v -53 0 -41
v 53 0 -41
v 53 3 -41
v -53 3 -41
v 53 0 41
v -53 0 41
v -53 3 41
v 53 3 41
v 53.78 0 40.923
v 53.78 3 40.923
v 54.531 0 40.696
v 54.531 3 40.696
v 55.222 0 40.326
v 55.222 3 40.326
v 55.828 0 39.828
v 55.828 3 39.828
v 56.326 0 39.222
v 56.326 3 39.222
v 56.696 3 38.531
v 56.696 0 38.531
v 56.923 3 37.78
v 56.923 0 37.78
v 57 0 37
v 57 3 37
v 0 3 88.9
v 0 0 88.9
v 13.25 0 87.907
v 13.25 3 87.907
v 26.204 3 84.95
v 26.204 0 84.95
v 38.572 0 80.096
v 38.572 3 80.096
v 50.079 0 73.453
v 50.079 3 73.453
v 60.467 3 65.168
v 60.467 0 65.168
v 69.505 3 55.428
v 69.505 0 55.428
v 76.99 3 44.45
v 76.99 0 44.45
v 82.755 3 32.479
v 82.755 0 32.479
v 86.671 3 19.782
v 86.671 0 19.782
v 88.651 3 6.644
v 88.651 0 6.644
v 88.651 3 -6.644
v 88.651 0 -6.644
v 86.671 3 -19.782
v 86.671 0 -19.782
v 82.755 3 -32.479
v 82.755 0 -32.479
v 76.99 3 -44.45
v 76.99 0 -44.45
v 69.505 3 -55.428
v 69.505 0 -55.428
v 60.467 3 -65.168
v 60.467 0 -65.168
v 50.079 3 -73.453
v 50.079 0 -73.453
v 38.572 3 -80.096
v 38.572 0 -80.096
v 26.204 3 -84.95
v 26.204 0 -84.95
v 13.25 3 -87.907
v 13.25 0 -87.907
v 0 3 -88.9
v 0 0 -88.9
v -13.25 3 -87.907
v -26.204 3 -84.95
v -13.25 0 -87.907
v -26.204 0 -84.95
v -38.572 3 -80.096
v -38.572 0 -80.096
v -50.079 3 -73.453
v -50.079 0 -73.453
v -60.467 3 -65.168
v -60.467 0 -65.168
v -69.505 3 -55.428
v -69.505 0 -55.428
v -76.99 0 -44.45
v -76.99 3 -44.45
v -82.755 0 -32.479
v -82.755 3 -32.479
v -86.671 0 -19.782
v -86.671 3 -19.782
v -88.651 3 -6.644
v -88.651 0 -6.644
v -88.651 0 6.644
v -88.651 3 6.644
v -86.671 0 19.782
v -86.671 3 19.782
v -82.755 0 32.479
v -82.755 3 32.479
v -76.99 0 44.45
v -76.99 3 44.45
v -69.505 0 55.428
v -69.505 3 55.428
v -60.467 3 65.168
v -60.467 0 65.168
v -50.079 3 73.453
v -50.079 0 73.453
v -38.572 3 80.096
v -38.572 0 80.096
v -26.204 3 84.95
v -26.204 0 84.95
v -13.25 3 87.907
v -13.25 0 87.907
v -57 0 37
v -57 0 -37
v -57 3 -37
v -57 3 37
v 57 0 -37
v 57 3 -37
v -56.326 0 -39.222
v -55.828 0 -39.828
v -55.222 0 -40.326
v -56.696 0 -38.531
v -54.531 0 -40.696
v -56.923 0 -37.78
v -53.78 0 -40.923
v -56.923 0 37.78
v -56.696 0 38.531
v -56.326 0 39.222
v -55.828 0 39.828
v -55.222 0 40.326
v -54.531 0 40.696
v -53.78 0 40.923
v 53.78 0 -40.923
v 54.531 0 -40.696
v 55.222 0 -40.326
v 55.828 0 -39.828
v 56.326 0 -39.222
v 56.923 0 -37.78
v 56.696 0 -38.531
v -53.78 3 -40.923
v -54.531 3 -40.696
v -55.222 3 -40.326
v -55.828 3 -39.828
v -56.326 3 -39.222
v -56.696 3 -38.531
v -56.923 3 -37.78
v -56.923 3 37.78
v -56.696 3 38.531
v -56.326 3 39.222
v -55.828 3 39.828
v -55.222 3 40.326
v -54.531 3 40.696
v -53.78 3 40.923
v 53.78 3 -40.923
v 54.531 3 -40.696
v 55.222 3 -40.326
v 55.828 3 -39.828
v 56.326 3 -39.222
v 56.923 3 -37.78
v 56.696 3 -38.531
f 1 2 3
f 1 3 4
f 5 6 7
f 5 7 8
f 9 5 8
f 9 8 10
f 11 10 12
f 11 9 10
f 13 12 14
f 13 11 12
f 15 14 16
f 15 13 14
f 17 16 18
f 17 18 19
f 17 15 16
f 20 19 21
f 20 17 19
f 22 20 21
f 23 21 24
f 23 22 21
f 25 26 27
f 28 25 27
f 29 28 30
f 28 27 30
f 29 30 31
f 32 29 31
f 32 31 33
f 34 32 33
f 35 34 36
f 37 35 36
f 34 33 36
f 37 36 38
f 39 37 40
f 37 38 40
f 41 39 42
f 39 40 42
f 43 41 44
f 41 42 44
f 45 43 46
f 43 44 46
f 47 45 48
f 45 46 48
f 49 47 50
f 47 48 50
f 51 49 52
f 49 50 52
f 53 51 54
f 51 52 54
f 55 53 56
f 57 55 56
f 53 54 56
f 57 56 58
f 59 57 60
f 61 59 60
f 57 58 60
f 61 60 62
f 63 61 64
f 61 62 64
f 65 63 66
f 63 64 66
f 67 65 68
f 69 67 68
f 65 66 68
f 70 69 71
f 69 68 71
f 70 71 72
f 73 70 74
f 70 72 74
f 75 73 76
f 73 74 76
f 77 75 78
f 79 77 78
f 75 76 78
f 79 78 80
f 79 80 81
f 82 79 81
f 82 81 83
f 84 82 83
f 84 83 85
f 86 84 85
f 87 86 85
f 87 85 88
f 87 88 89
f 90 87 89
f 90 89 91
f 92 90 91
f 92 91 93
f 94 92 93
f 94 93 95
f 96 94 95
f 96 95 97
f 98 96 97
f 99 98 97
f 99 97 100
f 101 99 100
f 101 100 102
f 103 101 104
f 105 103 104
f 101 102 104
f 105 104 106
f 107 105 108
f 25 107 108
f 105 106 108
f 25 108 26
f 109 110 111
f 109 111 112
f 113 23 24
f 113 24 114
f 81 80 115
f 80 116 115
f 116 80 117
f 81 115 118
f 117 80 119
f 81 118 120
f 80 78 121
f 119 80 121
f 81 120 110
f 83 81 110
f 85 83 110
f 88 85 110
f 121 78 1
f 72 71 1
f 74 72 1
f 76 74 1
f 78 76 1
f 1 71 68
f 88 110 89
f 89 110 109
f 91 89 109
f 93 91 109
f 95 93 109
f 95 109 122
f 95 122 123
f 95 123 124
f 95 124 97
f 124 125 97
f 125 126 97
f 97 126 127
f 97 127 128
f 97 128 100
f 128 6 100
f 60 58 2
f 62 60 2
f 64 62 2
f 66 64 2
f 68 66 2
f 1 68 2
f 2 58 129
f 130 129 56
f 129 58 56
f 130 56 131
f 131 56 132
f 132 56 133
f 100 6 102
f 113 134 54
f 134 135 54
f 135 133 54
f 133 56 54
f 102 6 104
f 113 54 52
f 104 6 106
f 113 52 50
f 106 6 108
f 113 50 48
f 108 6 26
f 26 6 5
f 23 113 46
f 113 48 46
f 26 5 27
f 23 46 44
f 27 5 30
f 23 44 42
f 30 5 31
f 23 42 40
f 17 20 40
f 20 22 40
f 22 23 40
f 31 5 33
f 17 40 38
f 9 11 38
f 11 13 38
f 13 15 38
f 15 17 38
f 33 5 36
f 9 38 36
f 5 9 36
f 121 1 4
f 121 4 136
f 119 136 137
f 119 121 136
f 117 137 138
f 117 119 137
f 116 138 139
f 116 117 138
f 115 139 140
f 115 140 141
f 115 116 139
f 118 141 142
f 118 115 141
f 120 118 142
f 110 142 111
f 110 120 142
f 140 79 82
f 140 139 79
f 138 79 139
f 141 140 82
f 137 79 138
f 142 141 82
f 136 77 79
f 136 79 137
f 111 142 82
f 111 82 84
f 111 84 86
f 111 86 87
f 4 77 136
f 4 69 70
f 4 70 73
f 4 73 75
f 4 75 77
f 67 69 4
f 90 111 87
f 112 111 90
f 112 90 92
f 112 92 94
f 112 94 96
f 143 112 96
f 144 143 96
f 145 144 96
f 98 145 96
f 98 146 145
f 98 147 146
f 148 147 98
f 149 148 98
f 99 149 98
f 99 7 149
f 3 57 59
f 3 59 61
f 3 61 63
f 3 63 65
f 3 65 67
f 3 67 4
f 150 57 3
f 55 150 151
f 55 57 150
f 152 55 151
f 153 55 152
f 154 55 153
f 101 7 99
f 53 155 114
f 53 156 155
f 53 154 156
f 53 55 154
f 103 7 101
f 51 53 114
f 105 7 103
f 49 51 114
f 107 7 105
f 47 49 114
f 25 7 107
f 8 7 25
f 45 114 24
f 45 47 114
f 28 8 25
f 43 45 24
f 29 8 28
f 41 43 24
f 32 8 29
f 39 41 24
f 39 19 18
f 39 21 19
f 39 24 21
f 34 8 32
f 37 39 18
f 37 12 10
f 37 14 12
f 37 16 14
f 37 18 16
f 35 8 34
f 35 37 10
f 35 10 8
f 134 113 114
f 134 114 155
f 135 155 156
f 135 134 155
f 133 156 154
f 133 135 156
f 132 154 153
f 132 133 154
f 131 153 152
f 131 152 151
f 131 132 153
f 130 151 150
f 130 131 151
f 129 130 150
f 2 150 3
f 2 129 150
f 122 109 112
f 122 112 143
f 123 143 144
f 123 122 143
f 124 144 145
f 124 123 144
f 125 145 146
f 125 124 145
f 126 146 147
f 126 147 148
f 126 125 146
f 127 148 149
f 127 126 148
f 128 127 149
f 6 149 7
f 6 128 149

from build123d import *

# Parameters (mm, degrees)
SKETCH1_R           = 88.9
BOSS_EXTRUDE1_DEPTH = 3
CUT_EXTRUDE2_DEPTH  = 3


with BuildPart() as part:
    # Sketch1 → Boss-Extrude1 (new body)
    with BuildSketch(Plane(origin=(0, 0, 0), x_dir=(1, 0, 0), z_dir=(0, 1, 0))):
        with Locations(Location((0, 0, 0), (0, 0, 270))):
            Circle(SKETCH1_R)
    extrude(amount=BOSS_EXTRUDE1_DEPTH)

    # Sketch3 → Cut-Extrude2 (cut)
    with BuildSketch(Plane.XZ):
        with BuildLine():
            Line((53, -41), (-53, -41))
            ThreePointArc((-53, -41), (-55.828427125, -39.828427125), (-57, -37))
            Line((-57, -37), (-57, 37))
            ThreePointArc((-57, 37), (-55.828427125, 39.828427125), (-53, 41))
            Line((-53, 41), (53, 41))
            ThreePointArc((53, 41), (55.828427125, 39.828427125), (57, 37))
            Line((57, 37), (57, -37))
            ThreePointArc((57, -37), (55.828427125, -39.828427125), (53, -41))
        make_face()
    extrude(amount=-CUT_EXTRUDE2_DEPTH, mode=Mode.SUBTRACT)


solid = part.part
